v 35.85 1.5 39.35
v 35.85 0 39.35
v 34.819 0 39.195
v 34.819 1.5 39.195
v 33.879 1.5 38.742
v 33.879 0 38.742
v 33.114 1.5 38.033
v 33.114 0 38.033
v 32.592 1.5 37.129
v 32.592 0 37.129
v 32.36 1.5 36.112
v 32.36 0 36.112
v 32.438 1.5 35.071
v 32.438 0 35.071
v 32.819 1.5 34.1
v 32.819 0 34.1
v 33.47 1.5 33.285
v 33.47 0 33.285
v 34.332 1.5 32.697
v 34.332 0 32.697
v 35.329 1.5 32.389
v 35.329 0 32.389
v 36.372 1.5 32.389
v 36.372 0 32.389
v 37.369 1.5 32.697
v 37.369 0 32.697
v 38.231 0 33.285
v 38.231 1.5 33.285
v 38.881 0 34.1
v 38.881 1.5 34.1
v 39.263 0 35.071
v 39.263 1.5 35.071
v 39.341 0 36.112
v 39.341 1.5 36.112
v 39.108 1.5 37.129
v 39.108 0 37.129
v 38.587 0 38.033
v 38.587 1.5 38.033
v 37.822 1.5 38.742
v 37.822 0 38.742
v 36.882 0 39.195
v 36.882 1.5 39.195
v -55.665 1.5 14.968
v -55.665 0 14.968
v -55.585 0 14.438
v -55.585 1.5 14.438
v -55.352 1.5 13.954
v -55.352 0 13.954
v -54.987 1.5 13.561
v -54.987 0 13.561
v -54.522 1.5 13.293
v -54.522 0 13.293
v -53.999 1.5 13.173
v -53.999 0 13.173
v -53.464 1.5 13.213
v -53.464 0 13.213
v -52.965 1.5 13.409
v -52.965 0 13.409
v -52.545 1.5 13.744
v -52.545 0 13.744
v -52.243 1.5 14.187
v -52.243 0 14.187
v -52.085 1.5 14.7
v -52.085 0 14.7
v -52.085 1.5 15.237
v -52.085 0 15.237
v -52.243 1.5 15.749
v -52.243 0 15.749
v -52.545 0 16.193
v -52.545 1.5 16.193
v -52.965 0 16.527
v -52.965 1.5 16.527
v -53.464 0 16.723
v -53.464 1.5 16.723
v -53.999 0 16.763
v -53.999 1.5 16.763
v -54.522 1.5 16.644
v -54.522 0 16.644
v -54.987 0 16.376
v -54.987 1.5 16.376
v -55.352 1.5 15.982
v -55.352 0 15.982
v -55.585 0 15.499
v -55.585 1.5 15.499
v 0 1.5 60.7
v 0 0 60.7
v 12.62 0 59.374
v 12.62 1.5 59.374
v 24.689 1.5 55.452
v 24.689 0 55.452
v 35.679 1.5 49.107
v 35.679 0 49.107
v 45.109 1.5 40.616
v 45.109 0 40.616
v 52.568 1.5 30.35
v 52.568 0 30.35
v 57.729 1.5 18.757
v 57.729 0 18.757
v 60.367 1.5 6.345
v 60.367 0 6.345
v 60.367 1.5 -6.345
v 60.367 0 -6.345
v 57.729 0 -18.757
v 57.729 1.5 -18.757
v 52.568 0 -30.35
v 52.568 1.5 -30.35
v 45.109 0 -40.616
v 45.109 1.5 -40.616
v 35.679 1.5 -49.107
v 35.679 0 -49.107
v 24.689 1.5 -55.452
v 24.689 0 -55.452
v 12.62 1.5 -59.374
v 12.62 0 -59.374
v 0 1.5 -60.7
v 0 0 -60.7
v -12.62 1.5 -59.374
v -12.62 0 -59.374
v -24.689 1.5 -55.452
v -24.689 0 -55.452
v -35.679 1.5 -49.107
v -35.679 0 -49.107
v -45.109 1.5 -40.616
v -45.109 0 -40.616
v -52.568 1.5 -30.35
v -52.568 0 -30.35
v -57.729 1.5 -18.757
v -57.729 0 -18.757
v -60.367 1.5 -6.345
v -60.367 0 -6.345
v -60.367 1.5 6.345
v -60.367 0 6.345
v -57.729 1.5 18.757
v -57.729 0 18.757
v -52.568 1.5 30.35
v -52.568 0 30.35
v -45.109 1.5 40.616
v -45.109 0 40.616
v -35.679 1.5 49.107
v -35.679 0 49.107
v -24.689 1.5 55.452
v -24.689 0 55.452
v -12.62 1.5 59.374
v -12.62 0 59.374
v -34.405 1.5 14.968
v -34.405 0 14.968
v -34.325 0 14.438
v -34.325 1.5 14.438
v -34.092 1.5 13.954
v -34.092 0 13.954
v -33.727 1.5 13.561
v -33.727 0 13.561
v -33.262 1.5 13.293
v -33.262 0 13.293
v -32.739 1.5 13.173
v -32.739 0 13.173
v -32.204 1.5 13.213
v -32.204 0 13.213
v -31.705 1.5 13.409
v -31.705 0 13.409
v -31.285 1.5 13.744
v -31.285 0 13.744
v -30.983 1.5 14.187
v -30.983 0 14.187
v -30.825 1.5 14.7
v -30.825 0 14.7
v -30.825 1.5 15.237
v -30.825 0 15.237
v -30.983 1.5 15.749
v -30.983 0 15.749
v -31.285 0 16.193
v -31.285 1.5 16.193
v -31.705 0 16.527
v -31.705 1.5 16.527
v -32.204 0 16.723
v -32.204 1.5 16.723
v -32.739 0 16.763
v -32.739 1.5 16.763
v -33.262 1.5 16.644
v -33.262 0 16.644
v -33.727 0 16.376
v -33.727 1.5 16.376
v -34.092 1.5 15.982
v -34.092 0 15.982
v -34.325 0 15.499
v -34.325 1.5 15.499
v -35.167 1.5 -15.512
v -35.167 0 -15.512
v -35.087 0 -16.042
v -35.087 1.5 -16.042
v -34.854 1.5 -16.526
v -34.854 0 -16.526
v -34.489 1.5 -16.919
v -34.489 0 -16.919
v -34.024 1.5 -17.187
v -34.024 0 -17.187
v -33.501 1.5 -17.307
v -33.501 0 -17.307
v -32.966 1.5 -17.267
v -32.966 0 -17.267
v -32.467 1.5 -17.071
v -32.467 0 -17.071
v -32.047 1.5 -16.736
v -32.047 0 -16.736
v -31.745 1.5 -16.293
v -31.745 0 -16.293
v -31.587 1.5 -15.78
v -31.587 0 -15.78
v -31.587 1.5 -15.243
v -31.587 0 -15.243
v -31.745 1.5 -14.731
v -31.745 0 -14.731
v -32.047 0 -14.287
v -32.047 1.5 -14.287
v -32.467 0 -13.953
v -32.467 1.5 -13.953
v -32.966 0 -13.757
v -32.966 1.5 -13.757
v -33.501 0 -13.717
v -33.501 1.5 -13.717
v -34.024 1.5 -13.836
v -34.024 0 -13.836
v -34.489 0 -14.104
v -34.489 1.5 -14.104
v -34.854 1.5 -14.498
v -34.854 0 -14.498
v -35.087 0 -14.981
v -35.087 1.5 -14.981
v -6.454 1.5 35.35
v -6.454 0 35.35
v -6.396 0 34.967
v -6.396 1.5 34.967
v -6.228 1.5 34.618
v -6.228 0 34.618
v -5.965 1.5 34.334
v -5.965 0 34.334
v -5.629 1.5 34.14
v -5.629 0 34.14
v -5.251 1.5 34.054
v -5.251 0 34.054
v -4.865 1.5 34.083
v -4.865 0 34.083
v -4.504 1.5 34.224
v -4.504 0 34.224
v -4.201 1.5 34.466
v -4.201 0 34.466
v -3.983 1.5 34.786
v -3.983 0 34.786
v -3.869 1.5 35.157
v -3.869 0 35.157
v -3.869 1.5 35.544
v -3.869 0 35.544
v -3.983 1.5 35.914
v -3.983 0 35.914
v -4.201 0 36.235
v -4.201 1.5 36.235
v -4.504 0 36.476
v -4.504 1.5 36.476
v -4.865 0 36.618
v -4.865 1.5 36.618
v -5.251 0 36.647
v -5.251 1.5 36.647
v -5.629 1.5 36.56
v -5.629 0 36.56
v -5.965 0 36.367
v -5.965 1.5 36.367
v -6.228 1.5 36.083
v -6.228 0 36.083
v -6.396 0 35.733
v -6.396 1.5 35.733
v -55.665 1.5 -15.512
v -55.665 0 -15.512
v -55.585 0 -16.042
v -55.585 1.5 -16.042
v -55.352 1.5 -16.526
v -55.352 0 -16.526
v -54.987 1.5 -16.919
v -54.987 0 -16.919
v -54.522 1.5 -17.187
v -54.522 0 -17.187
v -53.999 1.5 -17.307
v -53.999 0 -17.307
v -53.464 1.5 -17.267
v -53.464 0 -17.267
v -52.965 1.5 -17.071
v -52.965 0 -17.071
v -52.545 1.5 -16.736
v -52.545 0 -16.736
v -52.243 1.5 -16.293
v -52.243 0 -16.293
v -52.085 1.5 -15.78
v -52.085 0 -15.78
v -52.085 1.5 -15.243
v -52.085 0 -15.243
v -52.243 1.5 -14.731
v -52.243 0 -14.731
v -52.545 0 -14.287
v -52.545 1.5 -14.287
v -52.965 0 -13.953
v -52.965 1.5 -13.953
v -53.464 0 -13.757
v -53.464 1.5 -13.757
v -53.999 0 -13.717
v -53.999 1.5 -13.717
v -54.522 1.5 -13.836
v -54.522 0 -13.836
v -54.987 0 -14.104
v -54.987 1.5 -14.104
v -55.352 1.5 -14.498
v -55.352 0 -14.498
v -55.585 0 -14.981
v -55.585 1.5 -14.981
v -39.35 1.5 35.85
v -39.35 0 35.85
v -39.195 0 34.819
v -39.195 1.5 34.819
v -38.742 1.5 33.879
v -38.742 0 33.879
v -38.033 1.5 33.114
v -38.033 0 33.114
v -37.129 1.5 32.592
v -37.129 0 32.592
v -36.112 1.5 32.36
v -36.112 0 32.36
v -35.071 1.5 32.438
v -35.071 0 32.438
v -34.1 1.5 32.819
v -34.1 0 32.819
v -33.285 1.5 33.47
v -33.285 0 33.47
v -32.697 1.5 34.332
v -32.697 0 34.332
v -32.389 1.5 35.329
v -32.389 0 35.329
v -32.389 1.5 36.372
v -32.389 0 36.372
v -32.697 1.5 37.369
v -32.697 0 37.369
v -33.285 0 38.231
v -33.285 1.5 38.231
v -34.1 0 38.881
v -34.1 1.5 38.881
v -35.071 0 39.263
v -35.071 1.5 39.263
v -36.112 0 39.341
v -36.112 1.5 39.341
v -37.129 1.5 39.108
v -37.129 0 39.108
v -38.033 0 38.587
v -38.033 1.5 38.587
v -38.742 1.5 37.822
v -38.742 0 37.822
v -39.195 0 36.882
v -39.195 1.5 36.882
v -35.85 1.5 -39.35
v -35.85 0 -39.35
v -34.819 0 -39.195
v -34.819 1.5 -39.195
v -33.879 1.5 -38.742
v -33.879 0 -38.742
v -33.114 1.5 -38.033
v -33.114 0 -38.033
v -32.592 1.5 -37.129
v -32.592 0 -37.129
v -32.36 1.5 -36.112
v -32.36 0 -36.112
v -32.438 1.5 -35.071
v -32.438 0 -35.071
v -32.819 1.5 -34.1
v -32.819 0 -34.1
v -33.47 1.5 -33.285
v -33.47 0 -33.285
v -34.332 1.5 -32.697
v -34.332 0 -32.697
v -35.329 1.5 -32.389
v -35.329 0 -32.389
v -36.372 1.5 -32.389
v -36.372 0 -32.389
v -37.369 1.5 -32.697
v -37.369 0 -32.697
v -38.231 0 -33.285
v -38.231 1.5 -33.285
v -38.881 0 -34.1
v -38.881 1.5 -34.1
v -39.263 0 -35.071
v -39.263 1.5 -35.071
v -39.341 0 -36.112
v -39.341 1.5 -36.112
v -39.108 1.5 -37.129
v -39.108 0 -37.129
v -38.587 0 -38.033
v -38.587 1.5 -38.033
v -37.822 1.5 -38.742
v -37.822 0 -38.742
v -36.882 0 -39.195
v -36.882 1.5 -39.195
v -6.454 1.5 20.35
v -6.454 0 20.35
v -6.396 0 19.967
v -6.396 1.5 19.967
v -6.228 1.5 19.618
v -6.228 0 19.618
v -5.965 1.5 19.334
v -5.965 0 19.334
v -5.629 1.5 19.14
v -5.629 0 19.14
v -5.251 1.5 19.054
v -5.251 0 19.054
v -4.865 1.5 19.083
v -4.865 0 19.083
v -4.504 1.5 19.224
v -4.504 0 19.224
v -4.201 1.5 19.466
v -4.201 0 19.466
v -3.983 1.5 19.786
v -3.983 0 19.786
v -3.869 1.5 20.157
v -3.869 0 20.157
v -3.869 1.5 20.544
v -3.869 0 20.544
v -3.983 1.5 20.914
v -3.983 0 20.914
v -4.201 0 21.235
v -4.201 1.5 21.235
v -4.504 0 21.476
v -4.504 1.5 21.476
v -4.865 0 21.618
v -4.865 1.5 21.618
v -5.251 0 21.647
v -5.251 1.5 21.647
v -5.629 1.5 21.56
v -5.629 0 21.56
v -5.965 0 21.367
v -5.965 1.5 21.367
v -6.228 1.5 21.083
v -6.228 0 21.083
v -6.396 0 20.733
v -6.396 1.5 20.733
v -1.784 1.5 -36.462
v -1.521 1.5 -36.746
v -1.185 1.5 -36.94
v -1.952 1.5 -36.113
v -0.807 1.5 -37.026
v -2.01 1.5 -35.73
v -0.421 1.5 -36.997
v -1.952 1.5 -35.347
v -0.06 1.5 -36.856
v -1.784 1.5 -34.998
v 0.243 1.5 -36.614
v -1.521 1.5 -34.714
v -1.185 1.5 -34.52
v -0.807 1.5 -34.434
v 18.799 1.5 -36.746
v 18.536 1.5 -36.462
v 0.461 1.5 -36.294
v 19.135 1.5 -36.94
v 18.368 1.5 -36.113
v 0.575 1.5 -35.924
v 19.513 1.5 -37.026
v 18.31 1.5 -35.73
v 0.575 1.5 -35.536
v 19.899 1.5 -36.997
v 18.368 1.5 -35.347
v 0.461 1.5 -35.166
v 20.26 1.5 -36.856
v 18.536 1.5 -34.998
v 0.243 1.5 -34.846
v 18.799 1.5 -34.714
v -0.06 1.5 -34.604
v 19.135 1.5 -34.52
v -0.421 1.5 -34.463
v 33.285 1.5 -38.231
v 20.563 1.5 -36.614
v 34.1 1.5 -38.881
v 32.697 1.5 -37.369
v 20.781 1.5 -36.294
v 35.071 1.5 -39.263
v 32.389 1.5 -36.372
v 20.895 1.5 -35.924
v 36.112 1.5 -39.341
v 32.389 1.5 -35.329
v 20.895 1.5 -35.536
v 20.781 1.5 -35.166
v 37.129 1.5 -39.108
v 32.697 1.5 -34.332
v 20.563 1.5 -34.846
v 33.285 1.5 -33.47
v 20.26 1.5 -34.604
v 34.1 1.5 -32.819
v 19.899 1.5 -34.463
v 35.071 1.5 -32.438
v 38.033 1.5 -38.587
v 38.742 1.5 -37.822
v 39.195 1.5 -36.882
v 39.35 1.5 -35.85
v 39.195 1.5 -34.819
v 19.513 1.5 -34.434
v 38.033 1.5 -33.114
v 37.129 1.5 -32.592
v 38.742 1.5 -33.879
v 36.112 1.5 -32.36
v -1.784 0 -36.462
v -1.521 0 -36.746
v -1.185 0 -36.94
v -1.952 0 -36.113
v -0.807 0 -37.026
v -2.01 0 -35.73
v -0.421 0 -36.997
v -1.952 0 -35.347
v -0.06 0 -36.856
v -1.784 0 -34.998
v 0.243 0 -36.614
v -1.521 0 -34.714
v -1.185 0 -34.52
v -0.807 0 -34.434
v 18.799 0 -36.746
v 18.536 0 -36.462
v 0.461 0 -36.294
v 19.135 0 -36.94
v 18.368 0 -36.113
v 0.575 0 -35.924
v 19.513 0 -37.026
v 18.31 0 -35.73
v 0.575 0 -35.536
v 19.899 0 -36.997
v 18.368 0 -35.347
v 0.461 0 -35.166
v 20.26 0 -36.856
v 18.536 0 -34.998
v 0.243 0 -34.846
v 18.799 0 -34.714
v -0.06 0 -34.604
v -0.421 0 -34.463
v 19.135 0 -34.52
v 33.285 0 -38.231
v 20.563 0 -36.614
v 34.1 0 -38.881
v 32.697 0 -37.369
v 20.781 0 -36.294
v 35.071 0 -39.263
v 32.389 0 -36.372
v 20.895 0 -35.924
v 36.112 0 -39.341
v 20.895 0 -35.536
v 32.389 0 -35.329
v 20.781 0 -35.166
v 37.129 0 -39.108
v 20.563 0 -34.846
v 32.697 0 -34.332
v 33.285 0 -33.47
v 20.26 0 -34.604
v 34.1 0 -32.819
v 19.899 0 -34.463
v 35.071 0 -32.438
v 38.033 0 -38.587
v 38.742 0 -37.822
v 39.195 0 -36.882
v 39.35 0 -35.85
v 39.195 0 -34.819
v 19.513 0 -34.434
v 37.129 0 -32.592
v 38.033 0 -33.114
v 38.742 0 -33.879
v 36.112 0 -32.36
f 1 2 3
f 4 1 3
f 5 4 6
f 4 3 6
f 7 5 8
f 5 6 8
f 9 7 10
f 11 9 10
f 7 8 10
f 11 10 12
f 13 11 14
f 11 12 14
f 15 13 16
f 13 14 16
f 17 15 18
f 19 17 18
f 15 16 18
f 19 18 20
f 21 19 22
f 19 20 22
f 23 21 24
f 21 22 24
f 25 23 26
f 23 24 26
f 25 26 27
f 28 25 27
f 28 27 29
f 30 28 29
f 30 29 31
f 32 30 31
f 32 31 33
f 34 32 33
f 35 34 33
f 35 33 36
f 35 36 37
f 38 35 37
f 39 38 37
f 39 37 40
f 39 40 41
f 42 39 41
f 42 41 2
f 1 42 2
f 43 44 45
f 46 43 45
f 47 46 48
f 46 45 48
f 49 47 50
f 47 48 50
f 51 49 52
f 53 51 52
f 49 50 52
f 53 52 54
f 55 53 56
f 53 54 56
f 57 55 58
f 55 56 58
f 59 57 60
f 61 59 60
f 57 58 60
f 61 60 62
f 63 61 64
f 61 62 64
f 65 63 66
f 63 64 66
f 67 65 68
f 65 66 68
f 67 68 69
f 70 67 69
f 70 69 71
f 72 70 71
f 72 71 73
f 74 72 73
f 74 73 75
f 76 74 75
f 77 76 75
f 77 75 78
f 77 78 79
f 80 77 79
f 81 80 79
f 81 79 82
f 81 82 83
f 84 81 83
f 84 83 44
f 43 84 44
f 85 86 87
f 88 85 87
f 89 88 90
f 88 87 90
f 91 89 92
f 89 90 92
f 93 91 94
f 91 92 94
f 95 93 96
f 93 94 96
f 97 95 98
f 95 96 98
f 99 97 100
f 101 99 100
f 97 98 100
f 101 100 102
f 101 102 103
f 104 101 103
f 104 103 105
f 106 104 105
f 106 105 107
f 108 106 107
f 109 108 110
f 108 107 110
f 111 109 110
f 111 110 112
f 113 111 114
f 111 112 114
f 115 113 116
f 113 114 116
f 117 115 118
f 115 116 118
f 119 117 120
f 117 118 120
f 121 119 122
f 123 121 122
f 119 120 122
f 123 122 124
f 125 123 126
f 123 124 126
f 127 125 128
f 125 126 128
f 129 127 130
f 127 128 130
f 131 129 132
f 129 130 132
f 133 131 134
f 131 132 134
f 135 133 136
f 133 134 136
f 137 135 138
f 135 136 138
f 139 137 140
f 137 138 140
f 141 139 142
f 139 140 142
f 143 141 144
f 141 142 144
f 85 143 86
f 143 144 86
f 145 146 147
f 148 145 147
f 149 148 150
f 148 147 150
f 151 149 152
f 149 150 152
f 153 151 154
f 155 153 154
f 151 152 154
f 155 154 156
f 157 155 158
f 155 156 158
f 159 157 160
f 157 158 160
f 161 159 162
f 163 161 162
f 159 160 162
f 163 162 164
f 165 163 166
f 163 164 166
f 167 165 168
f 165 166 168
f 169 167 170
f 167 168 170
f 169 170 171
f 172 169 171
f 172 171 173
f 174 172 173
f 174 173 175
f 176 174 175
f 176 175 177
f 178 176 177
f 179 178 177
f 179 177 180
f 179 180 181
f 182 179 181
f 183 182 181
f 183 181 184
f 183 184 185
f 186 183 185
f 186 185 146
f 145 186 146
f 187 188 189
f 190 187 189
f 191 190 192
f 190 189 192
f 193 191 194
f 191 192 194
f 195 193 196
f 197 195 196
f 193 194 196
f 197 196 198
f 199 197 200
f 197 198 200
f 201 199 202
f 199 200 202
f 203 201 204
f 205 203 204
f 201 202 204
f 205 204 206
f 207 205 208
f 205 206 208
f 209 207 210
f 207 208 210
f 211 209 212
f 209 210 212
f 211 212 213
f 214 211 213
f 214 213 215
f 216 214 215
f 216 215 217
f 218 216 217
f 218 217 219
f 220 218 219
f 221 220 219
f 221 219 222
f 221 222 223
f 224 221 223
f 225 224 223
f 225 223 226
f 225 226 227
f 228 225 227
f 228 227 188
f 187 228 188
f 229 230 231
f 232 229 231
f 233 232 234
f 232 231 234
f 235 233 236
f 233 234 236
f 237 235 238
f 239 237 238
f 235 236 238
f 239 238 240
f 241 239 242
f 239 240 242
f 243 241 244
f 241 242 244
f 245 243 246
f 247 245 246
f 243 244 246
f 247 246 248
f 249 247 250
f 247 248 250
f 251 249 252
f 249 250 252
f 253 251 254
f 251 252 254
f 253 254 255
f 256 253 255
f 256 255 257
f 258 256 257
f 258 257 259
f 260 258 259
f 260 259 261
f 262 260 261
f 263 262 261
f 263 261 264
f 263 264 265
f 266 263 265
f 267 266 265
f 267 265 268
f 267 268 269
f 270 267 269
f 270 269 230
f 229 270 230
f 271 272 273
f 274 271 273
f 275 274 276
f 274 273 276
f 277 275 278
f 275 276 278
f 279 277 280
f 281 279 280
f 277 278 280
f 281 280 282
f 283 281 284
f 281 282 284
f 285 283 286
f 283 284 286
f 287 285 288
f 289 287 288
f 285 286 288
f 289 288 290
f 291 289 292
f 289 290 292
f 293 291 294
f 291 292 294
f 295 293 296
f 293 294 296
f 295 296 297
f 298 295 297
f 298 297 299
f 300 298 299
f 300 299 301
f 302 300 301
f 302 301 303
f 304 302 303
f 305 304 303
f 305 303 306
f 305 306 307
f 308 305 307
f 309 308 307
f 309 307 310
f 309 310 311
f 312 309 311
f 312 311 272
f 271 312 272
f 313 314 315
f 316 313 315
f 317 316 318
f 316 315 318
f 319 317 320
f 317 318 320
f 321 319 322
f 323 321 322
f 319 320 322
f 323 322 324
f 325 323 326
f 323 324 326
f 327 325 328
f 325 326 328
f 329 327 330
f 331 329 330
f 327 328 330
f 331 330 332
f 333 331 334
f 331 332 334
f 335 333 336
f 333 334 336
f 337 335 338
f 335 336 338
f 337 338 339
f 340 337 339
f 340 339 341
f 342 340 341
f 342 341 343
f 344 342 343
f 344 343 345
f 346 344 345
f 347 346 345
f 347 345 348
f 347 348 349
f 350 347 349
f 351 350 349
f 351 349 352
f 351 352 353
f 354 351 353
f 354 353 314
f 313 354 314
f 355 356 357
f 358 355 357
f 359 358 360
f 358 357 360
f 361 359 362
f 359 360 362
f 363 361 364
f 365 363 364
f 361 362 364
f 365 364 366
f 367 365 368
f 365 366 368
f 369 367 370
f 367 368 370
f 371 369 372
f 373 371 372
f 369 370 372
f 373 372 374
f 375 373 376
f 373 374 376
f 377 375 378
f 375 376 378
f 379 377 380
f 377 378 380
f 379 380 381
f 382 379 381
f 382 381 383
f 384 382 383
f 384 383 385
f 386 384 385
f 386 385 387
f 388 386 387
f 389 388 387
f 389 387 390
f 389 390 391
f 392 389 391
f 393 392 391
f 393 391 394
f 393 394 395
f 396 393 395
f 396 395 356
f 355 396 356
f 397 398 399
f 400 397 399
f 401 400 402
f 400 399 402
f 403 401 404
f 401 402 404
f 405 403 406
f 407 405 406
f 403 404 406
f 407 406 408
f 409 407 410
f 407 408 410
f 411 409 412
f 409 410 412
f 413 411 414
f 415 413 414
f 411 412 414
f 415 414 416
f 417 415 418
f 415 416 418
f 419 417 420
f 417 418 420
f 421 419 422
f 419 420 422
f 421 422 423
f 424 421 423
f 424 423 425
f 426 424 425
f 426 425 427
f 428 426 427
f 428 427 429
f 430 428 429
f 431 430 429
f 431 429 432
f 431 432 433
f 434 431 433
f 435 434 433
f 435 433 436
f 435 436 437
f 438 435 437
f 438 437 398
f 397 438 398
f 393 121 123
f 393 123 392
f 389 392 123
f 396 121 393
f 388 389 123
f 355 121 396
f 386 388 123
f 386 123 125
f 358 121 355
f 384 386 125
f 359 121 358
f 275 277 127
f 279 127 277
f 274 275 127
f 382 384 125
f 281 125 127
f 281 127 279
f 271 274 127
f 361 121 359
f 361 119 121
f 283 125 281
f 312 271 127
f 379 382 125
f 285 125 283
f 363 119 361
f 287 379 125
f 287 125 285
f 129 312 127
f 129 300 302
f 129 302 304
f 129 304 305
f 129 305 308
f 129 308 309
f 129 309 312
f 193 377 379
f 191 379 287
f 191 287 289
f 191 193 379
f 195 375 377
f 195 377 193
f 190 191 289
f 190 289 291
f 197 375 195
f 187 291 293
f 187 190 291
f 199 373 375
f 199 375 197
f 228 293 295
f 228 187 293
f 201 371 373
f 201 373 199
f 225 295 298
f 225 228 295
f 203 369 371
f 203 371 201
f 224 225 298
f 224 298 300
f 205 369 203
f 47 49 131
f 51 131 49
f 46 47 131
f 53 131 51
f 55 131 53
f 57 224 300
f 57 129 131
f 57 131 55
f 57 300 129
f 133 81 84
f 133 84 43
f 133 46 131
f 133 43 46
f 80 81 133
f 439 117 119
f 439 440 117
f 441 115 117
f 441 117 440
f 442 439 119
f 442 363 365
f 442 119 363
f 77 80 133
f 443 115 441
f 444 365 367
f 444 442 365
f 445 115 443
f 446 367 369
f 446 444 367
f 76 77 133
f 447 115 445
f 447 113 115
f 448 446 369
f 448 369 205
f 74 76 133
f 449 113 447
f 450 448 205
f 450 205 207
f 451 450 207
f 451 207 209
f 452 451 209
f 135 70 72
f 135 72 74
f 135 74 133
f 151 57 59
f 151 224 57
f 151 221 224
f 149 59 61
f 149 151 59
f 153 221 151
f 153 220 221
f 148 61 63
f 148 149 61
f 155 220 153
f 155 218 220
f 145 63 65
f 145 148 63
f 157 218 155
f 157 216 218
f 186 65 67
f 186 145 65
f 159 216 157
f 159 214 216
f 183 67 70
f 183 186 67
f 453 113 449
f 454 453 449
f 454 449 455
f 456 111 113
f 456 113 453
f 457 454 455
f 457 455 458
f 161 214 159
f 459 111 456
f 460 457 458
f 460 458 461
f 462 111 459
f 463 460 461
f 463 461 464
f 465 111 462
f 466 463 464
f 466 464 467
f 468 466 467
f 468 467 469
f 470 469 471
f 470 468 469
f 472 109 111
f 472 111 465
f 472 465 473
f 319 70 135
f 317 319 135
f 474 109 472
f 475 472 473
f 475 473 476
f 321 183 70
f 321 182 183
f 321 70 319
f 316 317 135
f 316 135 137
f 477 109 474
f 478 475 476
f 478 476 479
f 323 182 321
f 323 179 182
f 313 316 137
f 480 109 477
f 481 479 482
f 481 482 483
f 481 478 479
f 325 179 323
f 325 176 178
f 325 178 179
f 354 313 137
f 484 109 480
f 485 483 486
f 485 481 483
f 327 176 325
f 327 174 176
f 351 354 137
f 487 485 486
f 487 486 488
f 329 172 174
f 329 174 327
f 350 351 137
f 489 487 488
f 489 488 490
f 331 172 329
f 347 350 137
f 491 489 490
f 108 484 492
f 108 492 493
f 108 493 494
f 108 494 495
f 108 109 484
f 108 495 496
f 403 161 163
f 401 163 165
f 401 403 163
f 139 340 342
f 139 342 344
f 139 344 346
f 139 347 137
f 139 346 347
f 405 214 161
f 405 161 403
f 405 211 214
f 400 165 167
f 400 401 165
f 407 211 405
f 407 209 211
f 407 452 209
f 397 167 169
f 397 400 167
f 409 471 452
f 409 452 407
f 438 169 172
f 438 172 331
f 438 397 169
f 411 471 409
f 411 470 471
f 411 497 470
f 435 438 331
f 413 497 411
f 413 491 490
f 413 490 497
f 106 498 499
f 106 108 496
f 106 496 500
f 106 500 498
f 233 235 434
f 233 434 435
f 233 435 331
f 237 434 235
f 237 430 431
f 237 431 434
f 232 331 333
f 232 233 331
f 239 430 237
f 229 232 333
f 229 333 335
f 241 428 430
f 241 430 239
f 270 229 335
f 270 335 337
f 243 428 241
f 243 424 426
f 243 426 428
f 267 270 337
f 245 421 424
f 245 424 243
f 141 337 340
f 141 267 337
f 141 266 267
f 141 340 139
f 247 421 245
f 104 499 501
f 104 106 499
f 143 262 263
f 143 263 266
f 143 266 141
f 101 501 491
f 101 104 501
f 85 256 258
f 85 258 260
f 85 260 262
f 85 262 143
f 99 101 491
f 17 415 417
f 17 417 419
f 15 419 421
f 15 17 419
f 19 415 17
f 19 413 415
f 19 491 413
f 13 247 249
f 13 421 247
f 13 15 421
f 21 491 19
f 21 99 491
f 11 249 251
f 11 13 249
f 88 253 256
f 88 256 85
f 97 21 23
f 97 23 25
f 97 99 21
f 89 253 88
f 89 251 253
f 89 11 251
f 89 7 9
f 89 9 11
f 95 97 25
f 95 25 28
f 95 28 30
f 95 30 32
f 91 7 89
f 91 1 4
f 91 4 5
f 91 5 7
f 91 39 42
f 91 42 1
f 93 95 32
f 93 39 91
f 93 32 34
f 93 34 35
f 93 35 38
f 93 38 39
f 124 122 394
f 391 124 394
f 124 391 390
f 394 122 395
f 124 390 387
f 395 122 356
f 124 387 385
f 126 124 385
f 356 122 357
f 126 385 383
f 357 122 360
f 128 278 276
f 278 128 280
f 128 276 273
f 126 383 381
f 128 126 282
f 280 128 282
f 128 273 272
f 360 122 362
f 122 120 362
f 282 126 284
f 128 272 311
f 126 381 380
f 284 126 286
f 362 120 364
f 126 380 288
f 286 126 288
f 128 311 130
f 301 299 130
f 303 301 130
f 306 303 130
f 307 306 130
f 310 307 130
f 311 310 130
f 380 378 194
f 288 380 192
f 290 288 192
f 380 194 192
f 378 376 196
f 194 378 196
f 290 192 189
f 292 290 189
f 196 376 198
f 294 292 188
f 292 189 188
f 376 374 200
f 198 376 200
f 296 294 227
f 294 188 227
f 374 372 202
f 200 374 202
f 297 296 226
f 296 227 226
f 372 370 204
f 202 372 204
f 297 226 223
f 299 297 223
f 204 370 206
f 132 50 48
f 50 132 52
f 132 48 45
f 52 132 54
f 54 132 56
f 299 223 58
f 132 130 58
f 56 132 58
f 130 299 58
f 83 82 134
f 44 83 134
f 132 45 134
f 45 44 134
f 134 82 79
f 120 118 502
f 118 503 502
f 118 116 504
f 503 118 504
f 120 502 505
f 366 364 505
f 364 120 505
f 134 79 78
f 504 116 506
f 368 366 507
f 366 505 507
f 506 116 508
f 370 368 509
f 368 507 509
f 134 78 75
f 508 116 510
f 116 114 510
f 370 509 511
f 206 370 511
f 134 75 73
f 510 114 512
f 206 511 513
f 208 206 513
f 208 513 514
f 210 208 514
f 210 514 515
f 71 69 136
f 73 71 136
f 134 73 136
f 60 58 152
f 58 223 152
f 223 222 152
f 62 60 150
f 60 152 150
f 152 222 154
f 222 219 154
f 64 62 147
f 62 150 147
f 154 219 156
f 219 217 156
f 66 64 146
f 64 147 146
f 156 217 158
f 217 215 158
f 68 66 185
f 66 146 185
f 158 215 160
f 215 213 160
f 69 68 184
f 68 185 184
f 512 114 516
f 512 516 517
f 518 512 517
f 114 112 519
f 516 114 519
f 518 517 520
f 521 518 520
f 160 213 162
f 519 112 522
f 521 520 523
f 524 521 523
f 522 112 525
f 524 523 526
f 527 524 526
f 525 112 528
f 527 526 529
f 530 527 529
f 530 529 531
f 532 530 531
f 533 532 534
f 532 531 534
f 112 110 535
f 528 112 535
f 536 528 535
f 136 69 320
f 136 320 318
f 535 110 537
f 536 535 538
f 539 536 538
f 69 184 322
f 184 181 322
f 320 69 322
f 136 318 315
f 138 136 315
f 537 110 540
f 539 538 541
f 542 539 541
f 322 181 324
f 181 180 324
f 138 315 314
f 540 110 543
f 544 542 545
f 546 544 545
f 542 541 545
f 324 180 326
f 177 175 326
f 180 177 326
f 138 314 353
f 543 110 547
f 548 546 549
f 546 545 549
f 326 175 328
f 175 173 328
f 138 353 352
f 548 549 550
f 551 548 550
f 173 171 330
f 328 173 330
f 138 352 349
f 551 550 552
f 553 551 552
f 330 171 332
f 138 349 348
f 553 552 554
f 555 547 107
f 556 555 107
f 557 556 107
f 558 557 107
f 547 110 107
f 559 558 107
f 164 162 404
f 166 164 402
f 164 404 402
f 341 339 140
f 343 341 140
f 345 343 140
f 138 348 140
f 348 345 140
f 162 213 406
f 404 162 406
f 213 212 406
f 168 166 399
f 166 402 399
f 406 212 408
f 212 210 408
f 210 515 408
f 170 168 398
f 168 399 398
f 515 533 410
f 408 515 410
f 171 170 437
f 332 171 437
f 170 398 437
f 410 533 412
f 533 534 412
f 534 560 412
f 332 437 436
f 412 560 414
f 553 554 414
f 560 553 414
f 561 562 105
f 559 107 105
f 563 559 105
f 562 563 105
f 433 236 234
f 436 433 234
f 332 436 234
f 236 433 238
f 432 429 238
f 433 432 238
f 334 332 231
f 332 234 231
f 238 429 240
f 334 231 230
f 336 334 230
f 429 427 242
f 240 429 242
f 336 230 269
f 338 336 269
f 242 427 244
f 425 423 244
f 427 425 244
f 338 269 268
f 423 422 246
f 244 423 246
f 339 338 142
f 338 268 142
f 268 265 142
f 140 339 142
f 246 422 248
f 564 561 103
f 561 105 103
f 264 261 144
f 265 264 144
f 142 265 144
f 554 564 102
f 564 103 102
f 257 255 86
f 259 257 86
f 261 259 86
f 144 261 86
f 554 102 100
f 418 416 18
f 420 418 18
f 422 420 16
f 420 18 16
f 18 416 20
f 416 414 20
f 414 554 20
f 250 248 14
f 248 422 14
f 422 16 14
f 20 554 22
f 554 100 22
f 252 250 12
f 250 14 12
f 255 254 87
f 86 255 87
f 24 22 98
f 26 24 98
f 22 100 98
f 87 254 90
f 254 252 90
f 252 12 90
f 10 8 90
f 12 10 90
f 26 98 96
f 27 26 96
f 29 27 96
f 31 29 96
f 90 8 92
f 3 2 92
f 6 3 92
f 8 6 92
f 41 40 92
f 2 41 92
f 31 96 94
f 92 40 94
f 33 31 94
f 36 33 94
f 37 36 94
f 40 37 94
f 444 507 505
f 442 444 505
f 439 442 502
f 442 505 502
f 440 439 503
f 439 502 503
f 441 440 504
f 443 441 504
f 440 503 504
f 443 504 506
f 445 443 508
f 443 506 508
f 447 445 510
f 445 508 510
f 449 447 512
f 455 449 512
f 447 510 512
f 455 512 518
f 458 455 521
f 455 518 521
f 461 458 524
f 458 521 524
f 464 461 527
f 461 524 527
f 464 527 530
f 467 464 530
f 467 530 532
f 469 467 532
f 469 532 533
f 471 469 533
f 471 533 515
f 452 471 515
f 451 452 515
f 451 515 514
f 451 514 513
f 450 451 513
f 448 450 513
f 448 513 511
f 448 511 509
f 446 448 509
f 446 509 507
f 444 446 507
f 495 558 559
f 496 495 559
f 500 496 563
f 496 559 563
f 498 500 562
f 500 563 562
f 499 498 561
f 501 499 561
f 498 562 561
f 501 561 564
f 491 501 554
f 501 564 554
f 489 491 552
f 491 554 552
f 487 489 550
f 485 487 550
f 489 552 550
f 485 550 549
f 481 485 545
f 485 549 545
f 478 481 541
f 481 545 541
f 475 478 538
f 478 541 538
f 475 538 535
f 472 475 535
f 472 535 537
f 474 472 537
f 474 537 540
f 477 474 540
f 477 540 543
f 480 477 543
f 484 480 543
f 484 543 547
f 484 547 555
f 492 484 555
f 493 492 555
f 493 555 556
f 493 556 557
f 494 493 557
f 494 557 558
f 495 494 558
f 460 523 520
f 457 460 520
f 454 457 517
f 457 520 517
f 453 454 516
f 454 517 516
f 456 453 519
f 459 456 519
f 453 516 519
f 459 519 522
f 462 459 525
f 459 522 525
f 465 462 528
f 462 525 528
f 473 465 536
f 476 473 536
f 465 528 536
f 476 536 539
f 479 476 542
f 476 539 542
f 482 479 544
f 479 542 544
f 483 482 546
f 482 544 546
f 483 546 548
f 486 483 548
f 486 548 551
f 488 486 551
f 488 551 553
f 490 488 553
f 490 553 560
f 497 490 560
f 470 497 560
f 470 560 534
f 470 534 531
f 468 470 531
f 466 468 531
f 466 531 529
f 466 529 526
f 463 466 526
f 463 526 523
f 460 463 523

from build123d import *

# Parameters (mm, degrees)
SKETCH1_R            = 60.7
BOSS_EXTRUDE1_DEPTH  = 1.5
M6_CLEARANCE_HOLE1_D = 7
CIRPATTERN1_COUNT    = 4
M2_CLEARANCE_HOLE1_D = 2.6
M3_CLEARANCE_HOLE2_D = 3.6


with BuildPart() as part:
    # Sketch1 → Boss-Extrude1 (new body)
    with BuildSketch(Plane(origin=(0, 0, 0), x_dir=(1, 0, 0), z_dir=(0, 1, 0))):
        with Locations(Location((0, 0, 0), (0, 0, 270))):
            Circle(SKETCH1_R)
    extrude(amount=BOSS_EXTRUDE1_DEPTH)

    # M6 Clearance Hole1 (through all)
    with Locations(Plane(origin=(0, 1.5, 0), x_dir=(1, 0, 0), z_dir=(0, 1, 0))):
        with Locations((-35.850313806, -35.850313806)):
            m6_clearance_hole1 = Hole(M6_CLEARANCE_HOLE1_D / 2)

    # CirPattern1: M6 Clearance Hole1 ×4 about axis
    cirpattern1_axis = Axis((0, 0, 0), (0, 1, 0))
    for i in range(1, CIRPATTERN1_COUNT):
        add(m6_clearance_hole1.rotate(cirpattern1_axis, i * 360 / CIRPATTERN1_COUNT), mode=Mode.SUBTRACT)

    # M2 Clearance Hole1 (through all)
    with Locations(Plane(origin=(0, 1.5, 0), x_dir=(1, 0, 0), z_dir=(0, 1, 0))):
        with Locations((-0.709999951, 35.730000111), (19.610000128, 35.730000136), (-5.154, -20.350313806), (-5.154, -35.350313806)):
            Hole(M2_CLEARANCE_HOLE1_D / 2)

    # M3 Clearance Hole2 (through all)
    with Locations(Plane(origin=(0, 1.5, 0), x_dir=(1, 0, 0), z_dir=(0, 1, 0))):
        with Locations((-53.86454119, 15.511690642), (-53.864546519, -14.968309358), (-32.604546519, -14.968313075), (-33.36654119, 15.511687058)):
            Hole(M3_CLEARANCE_HOLE2_D / 2)


solid = part.part
